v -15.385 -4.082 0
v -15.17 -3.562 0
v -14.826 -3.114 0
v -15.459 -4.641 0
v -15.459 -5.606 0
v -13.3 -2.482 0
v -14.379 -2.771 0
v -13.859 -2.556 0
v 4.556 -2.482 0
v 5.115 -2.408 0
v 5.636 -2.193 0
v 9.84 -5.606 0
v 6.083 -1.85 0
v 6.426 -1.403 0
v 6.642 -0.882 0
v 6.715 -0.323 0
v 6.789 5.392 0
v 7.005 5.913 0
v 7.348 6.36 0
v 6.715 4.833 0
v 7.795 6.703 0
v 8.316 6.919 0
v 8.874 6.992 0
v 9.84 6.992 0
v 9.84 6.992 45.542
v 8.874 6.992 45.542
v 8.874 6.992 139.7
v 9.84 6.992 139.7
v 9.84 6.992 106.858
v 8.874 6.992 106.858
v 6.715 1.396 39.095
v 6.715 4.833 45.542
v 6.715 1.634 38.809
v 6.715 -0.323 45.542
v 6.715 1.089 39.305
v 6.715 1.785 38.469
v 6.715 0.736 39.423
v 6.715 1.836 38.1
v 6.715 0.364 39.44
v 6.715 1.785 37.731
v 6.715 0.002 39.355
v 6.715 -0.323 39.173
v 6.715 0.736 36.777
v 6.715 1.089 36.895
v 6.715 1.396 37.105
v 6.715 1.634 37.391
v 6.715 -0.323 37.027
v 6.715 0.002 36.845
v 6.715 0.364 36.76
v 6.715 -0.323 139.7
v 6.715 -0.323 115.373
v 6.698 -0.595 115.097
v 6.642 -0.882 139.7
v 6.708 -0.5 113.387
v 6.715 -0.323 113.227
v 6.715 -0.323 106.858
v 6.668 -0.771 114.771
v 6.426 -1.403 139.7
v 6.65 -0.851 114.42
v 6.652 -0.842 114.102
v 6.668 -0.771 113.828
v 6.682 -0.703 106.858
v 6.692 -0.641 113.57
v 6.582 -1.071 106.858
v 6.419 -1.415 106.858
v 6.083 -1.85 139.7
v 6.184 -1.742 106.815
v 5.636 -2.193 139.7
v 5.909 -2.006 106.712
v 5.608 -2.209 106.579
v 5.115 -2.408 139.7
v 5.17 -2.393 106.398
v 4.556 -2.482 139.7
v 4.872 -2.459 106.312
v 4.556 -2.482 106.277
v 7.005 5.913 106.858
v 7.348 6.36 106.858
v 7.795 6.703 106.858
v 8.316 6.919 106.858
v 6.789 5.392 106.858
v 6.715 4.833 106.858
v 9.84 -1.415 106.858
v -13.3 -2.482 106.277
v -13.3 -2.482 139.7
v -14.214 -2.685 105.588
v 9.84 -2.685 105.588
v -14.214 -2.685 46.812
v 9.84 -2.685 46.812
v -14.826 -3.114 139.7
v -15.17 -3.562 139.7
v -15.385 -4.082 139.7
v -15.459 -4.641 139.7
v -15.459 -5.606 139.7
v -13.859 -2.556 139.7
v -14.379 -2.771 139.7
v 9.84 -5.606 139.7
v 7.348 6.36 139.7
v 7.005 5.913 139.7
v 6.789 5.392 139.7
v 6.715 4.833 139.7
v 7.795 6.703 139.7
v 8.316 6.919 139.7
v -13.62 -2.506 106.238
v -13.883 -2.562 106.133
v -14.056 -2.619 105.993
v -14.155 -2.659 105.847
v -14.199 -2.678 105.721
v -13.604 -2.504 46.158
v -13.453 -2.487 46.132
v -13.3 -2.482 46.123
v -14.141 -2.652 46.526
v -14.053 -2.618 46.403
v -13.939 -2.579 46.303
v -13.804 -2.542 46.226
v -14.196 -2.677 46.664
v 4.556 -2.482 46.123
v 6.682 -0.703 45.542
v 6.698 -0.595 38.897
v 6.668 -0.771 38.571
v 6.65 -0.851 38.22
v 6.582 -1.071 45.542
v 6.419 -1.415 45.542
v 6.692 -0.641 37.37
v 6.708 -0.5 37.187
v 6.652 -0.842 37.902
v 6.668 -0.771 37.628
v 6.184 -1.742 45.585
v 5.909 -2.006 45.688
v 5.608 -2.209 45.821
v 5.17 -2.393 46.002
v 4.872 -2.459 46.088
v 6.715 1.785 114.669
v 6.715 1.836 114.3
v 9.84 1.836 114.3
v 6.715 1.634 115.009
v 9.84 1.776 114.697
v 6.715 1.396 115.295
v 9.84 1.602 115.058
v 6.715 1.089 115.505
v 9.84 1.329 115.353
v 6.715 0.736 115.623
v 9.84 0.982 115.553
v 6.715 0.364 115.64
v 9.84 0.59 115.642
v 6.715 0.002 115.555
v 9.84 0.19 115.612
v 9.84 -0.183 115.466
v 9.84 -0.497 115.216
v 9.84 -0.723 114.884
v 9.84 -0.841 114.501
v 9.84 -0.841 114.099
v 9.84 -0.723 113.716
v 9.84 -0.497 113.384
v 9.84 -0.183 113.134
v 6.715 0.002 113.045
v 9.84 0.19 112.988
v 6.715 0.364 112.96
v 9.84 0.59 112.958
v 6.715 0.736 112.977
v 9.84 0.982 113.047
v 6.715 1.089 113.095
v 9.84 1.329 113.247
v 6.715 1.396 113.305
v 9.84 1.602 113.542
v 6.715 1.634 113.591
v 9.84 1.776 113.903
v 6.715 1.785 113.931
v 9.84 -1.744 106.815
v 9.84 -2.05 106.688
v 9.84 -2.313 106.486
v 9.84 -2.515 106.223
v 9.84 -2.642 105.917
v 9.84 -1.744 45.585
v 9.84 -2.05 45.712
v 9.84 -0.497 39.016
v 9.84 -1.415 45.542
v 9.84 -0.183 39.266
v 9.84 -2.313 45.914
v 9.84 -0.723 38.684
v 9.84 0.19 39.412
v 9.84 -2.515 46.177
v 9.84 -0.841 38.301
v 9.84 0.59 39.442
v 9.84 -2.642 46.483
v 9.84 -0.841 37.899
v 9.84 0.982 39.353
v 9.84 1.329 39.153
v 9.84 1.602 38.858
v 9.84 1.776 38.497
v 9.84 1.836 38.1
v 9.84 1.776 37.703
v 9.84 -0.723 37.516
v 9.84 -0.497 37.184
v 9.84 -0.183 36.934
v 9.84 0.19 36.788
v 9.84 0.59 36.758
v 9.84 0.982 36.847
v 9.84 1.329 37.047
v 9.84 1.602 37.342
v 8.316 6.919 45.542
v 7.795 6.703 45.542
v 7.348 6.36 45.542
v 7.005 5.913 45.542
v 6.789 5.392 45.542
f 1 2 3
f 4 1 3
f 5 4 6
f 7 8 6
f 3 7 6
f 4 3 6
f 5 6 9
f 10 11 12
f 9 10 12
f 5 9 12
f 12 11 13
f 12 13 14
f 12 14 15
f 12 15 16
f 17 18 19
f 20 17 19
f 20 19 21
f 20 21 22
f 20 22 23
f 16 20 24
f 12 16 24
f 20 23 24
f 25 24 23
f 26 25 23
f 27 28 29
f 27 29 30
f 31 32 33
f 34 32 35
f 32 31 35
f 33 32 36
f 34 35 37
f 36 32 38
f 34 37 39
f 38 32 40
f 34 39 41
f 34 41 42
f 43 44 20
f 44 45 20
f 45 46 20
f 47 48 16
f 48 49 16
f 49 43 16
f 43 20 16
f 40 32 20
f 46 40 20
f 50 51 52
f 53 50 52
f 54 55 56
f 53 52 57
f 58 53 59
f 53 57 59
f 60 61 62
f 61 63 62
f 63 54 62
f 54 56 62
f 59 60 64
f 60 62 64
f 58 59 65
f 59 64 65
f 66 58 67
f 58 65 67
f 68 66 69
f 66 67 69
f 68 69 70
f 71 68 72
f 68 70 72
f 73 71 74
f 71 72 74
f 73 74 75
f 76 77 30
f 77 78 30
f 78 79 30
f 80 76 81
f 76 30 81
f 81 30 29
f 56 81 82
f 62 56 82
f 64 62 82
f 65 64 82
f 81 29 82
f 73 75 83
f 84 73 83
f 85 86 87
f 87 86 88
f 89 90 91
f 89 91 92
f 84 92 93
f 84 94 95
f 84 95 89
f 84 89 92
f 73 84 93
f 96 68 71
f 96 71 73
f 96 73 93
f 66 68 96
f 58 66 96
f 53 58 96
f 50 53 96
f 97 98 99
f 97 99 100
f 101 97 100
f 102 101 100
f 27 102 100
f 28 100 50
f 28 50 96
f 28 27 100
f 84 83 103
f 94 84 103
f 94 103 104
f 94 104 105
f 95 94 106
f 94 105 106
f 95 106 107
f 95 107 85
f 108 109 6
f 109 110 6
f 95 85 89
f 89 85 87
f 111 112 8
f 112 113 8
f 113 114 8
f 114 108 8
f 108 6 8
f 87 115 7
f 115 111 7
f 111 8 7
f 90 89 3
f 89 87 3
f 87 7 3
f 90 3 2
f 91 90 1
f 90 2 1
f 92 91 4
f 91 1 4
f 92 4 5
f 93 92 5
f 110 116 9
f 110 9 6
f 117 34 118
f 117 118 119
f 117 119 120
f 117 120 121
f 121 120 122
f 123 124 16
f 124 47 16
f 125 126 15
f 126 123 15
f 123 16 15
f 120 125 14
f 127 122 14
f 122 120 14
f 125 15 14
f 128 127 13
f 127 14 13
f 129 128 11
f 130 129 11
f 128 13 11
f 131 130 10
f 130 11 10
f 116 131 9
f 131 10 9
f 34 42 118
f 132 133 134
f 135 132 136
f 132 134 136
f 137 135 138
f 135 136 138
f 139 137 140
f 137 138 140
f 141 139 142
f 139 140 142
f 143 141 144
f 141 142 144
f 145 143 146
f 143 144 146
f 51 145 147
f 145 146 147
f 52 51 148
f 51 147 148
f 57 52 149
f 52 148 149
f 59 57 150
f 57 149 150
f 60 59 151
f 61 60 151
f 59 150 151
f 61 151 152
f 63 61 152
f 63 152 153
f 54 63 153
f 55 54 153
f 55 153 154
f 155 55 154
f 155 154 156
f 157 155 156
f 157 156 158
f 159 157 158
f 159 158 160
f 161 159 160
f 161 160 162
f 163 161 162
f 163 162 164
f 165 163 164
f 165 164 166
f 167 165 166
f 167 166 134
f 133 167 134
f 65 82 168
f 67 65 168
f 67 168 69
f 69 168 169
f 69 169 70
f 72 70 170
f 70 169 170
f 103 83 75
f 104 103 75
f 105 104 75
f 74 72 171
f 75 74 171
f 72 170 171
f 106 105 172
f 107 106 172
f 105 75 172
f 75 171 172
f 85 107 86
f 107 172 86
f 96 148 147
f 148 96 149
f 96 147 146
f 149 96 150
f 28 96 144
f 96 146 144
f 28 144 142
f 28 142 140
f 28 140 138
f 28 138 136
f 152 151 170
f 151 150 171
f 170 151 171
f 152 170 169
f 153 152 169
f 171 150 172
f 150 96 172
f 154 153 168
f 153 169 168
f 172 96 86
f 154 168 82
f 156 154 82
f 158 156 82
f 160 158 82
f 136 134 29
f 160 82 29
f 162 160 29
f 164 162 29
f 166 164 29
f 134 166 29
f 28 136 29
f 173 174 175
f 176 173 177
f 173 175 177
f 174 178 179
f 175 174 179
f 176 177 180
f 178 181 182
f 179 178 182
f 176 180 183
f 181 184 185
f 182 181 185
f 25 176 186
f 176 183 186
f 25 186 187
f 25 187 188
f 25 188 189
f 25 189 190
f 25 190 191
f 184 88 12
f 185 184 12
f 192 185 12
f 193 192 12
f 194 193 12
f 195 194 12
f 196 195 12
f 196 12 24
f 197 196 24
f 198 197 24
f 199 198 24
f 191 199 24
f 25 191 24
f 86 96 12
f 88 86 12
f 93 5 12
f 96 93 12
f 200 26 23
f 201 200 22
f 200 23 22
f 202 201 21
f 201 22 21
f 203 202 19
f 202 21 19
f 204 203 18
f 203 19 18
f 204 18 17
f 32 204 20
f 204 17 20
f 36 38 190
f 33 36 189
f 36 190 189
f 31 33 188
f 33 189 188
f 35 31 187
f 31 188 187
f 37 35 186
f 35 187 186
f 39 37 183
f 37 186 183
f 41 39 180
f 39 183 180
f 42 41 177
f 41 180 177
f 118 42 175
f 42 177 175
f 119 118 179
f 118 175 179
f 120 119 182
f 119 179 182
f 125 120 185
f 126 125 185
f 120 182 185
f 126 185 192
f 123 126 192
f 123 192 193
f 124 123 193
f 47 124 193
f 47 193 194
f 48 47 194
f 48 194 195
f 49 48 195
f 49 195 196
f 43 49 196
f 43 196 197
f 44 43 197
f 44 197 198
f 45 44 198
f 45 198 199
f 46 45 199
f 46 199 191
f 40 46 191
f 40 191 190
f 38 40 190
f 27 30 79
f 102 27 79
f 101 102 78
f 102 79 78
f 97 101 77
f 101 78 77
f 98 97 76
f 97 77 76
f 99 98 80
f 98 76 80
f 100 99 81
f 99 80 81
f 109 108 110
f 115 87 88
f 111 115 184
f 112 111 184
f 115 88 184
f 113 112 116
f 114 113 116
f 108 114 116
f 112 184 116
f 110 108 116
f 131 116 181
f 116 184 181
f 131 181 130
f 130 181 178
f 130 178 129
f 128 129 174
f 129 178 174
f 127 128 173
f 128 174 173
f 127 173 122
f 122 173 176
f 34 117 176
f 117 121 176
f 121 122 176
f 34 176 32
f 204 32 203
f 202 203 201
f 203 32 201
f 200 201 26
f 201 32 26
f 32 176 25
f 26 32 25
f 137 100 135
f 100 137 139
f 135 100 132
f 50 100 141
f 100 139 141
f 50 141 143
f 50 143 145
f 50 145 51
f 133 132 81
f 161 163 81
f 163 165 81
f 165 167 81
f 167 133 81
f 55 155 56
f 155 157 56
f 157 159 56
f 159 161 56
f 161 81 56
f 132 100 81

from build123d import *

# Parameters (mm, degrees)
F1_DEPTH = 139.7
F2_R     = 1.3462
F3_DEPTH = 25.2994
F5_DEPTH = 25.2994


with BuildPart() as f1:
    # F0 (on Top) → F1 (new body)
    with BuildSketch(Plane.XY):
        with BuildLine():
            Line((-15.458836, -4.64103), (-15.458836, -5.60623))
            Line((-15.458836, -5.60623), (9.839564, -5.60623))
            Line((9.839564, -5.60623), (9.839564, 6.99217))
            Line((9.839564, 6.99217), (8.874364, 6.99217))
            ThreePointArc((8.874364, 6.99217), (7.34772, 6.359813), (6.715364, 4.83317))
            Line((6.715364, 4.83317), (6.715364, -0.32303))
            ThreePointArc((6.715364, -0.32303), (6.083007, -1.849674), (4.556364, -2.48203))
            Line((4.556364, -2.48203), (-13.299836, -2.48203))
            ThreePointArc((-13.299836, -2.48203), (-14.82648, -3.114387), (-15.458836, -4.64103))
        make_face()
    extrude(amount=F1_DEPTH)

    # F2 (on face) → F3 (cut, through all)
    with BuildSketch(Plane.YZ.offset(9.839564)):
        with Locations((0.48977, 38.1)):
            Circle(F2_R)
        with Locations((0.48977, 114.3)):
            Circle(F2_R)
    extrude(amount=-F3_DEPTH, mode=Mode.SUBTRACT)

    # F4 (on face) → F5 (cut, through all)
    with BuildSketch(Plane.YZ.offset(9.839564)):
        with BuildLine():
            Line((-1.41523, 45.5422), (6.99217, 45.5422))
            Line((6.99217, 45.5422), (6.99217, 106.8578))
            Line((6.99217, 106.8578), (-1.41523, 106.8578))
            ThreePointArc((-1.41523, 106.8578), (-2.313256, 106.485826), (-2.68523, 105.5878))
            Line((-2.68523, 105.5878), (-2.68523, 46.8122))
            ThreePointArc((-2.68523, 46.8122), (-2.313256, 45.914174), (-1.41523, 45.5422))
        make_face()
    extrude(amount=-F5_DEPTH, mode=Mode.SUBTRACT)


solid = f1.part
